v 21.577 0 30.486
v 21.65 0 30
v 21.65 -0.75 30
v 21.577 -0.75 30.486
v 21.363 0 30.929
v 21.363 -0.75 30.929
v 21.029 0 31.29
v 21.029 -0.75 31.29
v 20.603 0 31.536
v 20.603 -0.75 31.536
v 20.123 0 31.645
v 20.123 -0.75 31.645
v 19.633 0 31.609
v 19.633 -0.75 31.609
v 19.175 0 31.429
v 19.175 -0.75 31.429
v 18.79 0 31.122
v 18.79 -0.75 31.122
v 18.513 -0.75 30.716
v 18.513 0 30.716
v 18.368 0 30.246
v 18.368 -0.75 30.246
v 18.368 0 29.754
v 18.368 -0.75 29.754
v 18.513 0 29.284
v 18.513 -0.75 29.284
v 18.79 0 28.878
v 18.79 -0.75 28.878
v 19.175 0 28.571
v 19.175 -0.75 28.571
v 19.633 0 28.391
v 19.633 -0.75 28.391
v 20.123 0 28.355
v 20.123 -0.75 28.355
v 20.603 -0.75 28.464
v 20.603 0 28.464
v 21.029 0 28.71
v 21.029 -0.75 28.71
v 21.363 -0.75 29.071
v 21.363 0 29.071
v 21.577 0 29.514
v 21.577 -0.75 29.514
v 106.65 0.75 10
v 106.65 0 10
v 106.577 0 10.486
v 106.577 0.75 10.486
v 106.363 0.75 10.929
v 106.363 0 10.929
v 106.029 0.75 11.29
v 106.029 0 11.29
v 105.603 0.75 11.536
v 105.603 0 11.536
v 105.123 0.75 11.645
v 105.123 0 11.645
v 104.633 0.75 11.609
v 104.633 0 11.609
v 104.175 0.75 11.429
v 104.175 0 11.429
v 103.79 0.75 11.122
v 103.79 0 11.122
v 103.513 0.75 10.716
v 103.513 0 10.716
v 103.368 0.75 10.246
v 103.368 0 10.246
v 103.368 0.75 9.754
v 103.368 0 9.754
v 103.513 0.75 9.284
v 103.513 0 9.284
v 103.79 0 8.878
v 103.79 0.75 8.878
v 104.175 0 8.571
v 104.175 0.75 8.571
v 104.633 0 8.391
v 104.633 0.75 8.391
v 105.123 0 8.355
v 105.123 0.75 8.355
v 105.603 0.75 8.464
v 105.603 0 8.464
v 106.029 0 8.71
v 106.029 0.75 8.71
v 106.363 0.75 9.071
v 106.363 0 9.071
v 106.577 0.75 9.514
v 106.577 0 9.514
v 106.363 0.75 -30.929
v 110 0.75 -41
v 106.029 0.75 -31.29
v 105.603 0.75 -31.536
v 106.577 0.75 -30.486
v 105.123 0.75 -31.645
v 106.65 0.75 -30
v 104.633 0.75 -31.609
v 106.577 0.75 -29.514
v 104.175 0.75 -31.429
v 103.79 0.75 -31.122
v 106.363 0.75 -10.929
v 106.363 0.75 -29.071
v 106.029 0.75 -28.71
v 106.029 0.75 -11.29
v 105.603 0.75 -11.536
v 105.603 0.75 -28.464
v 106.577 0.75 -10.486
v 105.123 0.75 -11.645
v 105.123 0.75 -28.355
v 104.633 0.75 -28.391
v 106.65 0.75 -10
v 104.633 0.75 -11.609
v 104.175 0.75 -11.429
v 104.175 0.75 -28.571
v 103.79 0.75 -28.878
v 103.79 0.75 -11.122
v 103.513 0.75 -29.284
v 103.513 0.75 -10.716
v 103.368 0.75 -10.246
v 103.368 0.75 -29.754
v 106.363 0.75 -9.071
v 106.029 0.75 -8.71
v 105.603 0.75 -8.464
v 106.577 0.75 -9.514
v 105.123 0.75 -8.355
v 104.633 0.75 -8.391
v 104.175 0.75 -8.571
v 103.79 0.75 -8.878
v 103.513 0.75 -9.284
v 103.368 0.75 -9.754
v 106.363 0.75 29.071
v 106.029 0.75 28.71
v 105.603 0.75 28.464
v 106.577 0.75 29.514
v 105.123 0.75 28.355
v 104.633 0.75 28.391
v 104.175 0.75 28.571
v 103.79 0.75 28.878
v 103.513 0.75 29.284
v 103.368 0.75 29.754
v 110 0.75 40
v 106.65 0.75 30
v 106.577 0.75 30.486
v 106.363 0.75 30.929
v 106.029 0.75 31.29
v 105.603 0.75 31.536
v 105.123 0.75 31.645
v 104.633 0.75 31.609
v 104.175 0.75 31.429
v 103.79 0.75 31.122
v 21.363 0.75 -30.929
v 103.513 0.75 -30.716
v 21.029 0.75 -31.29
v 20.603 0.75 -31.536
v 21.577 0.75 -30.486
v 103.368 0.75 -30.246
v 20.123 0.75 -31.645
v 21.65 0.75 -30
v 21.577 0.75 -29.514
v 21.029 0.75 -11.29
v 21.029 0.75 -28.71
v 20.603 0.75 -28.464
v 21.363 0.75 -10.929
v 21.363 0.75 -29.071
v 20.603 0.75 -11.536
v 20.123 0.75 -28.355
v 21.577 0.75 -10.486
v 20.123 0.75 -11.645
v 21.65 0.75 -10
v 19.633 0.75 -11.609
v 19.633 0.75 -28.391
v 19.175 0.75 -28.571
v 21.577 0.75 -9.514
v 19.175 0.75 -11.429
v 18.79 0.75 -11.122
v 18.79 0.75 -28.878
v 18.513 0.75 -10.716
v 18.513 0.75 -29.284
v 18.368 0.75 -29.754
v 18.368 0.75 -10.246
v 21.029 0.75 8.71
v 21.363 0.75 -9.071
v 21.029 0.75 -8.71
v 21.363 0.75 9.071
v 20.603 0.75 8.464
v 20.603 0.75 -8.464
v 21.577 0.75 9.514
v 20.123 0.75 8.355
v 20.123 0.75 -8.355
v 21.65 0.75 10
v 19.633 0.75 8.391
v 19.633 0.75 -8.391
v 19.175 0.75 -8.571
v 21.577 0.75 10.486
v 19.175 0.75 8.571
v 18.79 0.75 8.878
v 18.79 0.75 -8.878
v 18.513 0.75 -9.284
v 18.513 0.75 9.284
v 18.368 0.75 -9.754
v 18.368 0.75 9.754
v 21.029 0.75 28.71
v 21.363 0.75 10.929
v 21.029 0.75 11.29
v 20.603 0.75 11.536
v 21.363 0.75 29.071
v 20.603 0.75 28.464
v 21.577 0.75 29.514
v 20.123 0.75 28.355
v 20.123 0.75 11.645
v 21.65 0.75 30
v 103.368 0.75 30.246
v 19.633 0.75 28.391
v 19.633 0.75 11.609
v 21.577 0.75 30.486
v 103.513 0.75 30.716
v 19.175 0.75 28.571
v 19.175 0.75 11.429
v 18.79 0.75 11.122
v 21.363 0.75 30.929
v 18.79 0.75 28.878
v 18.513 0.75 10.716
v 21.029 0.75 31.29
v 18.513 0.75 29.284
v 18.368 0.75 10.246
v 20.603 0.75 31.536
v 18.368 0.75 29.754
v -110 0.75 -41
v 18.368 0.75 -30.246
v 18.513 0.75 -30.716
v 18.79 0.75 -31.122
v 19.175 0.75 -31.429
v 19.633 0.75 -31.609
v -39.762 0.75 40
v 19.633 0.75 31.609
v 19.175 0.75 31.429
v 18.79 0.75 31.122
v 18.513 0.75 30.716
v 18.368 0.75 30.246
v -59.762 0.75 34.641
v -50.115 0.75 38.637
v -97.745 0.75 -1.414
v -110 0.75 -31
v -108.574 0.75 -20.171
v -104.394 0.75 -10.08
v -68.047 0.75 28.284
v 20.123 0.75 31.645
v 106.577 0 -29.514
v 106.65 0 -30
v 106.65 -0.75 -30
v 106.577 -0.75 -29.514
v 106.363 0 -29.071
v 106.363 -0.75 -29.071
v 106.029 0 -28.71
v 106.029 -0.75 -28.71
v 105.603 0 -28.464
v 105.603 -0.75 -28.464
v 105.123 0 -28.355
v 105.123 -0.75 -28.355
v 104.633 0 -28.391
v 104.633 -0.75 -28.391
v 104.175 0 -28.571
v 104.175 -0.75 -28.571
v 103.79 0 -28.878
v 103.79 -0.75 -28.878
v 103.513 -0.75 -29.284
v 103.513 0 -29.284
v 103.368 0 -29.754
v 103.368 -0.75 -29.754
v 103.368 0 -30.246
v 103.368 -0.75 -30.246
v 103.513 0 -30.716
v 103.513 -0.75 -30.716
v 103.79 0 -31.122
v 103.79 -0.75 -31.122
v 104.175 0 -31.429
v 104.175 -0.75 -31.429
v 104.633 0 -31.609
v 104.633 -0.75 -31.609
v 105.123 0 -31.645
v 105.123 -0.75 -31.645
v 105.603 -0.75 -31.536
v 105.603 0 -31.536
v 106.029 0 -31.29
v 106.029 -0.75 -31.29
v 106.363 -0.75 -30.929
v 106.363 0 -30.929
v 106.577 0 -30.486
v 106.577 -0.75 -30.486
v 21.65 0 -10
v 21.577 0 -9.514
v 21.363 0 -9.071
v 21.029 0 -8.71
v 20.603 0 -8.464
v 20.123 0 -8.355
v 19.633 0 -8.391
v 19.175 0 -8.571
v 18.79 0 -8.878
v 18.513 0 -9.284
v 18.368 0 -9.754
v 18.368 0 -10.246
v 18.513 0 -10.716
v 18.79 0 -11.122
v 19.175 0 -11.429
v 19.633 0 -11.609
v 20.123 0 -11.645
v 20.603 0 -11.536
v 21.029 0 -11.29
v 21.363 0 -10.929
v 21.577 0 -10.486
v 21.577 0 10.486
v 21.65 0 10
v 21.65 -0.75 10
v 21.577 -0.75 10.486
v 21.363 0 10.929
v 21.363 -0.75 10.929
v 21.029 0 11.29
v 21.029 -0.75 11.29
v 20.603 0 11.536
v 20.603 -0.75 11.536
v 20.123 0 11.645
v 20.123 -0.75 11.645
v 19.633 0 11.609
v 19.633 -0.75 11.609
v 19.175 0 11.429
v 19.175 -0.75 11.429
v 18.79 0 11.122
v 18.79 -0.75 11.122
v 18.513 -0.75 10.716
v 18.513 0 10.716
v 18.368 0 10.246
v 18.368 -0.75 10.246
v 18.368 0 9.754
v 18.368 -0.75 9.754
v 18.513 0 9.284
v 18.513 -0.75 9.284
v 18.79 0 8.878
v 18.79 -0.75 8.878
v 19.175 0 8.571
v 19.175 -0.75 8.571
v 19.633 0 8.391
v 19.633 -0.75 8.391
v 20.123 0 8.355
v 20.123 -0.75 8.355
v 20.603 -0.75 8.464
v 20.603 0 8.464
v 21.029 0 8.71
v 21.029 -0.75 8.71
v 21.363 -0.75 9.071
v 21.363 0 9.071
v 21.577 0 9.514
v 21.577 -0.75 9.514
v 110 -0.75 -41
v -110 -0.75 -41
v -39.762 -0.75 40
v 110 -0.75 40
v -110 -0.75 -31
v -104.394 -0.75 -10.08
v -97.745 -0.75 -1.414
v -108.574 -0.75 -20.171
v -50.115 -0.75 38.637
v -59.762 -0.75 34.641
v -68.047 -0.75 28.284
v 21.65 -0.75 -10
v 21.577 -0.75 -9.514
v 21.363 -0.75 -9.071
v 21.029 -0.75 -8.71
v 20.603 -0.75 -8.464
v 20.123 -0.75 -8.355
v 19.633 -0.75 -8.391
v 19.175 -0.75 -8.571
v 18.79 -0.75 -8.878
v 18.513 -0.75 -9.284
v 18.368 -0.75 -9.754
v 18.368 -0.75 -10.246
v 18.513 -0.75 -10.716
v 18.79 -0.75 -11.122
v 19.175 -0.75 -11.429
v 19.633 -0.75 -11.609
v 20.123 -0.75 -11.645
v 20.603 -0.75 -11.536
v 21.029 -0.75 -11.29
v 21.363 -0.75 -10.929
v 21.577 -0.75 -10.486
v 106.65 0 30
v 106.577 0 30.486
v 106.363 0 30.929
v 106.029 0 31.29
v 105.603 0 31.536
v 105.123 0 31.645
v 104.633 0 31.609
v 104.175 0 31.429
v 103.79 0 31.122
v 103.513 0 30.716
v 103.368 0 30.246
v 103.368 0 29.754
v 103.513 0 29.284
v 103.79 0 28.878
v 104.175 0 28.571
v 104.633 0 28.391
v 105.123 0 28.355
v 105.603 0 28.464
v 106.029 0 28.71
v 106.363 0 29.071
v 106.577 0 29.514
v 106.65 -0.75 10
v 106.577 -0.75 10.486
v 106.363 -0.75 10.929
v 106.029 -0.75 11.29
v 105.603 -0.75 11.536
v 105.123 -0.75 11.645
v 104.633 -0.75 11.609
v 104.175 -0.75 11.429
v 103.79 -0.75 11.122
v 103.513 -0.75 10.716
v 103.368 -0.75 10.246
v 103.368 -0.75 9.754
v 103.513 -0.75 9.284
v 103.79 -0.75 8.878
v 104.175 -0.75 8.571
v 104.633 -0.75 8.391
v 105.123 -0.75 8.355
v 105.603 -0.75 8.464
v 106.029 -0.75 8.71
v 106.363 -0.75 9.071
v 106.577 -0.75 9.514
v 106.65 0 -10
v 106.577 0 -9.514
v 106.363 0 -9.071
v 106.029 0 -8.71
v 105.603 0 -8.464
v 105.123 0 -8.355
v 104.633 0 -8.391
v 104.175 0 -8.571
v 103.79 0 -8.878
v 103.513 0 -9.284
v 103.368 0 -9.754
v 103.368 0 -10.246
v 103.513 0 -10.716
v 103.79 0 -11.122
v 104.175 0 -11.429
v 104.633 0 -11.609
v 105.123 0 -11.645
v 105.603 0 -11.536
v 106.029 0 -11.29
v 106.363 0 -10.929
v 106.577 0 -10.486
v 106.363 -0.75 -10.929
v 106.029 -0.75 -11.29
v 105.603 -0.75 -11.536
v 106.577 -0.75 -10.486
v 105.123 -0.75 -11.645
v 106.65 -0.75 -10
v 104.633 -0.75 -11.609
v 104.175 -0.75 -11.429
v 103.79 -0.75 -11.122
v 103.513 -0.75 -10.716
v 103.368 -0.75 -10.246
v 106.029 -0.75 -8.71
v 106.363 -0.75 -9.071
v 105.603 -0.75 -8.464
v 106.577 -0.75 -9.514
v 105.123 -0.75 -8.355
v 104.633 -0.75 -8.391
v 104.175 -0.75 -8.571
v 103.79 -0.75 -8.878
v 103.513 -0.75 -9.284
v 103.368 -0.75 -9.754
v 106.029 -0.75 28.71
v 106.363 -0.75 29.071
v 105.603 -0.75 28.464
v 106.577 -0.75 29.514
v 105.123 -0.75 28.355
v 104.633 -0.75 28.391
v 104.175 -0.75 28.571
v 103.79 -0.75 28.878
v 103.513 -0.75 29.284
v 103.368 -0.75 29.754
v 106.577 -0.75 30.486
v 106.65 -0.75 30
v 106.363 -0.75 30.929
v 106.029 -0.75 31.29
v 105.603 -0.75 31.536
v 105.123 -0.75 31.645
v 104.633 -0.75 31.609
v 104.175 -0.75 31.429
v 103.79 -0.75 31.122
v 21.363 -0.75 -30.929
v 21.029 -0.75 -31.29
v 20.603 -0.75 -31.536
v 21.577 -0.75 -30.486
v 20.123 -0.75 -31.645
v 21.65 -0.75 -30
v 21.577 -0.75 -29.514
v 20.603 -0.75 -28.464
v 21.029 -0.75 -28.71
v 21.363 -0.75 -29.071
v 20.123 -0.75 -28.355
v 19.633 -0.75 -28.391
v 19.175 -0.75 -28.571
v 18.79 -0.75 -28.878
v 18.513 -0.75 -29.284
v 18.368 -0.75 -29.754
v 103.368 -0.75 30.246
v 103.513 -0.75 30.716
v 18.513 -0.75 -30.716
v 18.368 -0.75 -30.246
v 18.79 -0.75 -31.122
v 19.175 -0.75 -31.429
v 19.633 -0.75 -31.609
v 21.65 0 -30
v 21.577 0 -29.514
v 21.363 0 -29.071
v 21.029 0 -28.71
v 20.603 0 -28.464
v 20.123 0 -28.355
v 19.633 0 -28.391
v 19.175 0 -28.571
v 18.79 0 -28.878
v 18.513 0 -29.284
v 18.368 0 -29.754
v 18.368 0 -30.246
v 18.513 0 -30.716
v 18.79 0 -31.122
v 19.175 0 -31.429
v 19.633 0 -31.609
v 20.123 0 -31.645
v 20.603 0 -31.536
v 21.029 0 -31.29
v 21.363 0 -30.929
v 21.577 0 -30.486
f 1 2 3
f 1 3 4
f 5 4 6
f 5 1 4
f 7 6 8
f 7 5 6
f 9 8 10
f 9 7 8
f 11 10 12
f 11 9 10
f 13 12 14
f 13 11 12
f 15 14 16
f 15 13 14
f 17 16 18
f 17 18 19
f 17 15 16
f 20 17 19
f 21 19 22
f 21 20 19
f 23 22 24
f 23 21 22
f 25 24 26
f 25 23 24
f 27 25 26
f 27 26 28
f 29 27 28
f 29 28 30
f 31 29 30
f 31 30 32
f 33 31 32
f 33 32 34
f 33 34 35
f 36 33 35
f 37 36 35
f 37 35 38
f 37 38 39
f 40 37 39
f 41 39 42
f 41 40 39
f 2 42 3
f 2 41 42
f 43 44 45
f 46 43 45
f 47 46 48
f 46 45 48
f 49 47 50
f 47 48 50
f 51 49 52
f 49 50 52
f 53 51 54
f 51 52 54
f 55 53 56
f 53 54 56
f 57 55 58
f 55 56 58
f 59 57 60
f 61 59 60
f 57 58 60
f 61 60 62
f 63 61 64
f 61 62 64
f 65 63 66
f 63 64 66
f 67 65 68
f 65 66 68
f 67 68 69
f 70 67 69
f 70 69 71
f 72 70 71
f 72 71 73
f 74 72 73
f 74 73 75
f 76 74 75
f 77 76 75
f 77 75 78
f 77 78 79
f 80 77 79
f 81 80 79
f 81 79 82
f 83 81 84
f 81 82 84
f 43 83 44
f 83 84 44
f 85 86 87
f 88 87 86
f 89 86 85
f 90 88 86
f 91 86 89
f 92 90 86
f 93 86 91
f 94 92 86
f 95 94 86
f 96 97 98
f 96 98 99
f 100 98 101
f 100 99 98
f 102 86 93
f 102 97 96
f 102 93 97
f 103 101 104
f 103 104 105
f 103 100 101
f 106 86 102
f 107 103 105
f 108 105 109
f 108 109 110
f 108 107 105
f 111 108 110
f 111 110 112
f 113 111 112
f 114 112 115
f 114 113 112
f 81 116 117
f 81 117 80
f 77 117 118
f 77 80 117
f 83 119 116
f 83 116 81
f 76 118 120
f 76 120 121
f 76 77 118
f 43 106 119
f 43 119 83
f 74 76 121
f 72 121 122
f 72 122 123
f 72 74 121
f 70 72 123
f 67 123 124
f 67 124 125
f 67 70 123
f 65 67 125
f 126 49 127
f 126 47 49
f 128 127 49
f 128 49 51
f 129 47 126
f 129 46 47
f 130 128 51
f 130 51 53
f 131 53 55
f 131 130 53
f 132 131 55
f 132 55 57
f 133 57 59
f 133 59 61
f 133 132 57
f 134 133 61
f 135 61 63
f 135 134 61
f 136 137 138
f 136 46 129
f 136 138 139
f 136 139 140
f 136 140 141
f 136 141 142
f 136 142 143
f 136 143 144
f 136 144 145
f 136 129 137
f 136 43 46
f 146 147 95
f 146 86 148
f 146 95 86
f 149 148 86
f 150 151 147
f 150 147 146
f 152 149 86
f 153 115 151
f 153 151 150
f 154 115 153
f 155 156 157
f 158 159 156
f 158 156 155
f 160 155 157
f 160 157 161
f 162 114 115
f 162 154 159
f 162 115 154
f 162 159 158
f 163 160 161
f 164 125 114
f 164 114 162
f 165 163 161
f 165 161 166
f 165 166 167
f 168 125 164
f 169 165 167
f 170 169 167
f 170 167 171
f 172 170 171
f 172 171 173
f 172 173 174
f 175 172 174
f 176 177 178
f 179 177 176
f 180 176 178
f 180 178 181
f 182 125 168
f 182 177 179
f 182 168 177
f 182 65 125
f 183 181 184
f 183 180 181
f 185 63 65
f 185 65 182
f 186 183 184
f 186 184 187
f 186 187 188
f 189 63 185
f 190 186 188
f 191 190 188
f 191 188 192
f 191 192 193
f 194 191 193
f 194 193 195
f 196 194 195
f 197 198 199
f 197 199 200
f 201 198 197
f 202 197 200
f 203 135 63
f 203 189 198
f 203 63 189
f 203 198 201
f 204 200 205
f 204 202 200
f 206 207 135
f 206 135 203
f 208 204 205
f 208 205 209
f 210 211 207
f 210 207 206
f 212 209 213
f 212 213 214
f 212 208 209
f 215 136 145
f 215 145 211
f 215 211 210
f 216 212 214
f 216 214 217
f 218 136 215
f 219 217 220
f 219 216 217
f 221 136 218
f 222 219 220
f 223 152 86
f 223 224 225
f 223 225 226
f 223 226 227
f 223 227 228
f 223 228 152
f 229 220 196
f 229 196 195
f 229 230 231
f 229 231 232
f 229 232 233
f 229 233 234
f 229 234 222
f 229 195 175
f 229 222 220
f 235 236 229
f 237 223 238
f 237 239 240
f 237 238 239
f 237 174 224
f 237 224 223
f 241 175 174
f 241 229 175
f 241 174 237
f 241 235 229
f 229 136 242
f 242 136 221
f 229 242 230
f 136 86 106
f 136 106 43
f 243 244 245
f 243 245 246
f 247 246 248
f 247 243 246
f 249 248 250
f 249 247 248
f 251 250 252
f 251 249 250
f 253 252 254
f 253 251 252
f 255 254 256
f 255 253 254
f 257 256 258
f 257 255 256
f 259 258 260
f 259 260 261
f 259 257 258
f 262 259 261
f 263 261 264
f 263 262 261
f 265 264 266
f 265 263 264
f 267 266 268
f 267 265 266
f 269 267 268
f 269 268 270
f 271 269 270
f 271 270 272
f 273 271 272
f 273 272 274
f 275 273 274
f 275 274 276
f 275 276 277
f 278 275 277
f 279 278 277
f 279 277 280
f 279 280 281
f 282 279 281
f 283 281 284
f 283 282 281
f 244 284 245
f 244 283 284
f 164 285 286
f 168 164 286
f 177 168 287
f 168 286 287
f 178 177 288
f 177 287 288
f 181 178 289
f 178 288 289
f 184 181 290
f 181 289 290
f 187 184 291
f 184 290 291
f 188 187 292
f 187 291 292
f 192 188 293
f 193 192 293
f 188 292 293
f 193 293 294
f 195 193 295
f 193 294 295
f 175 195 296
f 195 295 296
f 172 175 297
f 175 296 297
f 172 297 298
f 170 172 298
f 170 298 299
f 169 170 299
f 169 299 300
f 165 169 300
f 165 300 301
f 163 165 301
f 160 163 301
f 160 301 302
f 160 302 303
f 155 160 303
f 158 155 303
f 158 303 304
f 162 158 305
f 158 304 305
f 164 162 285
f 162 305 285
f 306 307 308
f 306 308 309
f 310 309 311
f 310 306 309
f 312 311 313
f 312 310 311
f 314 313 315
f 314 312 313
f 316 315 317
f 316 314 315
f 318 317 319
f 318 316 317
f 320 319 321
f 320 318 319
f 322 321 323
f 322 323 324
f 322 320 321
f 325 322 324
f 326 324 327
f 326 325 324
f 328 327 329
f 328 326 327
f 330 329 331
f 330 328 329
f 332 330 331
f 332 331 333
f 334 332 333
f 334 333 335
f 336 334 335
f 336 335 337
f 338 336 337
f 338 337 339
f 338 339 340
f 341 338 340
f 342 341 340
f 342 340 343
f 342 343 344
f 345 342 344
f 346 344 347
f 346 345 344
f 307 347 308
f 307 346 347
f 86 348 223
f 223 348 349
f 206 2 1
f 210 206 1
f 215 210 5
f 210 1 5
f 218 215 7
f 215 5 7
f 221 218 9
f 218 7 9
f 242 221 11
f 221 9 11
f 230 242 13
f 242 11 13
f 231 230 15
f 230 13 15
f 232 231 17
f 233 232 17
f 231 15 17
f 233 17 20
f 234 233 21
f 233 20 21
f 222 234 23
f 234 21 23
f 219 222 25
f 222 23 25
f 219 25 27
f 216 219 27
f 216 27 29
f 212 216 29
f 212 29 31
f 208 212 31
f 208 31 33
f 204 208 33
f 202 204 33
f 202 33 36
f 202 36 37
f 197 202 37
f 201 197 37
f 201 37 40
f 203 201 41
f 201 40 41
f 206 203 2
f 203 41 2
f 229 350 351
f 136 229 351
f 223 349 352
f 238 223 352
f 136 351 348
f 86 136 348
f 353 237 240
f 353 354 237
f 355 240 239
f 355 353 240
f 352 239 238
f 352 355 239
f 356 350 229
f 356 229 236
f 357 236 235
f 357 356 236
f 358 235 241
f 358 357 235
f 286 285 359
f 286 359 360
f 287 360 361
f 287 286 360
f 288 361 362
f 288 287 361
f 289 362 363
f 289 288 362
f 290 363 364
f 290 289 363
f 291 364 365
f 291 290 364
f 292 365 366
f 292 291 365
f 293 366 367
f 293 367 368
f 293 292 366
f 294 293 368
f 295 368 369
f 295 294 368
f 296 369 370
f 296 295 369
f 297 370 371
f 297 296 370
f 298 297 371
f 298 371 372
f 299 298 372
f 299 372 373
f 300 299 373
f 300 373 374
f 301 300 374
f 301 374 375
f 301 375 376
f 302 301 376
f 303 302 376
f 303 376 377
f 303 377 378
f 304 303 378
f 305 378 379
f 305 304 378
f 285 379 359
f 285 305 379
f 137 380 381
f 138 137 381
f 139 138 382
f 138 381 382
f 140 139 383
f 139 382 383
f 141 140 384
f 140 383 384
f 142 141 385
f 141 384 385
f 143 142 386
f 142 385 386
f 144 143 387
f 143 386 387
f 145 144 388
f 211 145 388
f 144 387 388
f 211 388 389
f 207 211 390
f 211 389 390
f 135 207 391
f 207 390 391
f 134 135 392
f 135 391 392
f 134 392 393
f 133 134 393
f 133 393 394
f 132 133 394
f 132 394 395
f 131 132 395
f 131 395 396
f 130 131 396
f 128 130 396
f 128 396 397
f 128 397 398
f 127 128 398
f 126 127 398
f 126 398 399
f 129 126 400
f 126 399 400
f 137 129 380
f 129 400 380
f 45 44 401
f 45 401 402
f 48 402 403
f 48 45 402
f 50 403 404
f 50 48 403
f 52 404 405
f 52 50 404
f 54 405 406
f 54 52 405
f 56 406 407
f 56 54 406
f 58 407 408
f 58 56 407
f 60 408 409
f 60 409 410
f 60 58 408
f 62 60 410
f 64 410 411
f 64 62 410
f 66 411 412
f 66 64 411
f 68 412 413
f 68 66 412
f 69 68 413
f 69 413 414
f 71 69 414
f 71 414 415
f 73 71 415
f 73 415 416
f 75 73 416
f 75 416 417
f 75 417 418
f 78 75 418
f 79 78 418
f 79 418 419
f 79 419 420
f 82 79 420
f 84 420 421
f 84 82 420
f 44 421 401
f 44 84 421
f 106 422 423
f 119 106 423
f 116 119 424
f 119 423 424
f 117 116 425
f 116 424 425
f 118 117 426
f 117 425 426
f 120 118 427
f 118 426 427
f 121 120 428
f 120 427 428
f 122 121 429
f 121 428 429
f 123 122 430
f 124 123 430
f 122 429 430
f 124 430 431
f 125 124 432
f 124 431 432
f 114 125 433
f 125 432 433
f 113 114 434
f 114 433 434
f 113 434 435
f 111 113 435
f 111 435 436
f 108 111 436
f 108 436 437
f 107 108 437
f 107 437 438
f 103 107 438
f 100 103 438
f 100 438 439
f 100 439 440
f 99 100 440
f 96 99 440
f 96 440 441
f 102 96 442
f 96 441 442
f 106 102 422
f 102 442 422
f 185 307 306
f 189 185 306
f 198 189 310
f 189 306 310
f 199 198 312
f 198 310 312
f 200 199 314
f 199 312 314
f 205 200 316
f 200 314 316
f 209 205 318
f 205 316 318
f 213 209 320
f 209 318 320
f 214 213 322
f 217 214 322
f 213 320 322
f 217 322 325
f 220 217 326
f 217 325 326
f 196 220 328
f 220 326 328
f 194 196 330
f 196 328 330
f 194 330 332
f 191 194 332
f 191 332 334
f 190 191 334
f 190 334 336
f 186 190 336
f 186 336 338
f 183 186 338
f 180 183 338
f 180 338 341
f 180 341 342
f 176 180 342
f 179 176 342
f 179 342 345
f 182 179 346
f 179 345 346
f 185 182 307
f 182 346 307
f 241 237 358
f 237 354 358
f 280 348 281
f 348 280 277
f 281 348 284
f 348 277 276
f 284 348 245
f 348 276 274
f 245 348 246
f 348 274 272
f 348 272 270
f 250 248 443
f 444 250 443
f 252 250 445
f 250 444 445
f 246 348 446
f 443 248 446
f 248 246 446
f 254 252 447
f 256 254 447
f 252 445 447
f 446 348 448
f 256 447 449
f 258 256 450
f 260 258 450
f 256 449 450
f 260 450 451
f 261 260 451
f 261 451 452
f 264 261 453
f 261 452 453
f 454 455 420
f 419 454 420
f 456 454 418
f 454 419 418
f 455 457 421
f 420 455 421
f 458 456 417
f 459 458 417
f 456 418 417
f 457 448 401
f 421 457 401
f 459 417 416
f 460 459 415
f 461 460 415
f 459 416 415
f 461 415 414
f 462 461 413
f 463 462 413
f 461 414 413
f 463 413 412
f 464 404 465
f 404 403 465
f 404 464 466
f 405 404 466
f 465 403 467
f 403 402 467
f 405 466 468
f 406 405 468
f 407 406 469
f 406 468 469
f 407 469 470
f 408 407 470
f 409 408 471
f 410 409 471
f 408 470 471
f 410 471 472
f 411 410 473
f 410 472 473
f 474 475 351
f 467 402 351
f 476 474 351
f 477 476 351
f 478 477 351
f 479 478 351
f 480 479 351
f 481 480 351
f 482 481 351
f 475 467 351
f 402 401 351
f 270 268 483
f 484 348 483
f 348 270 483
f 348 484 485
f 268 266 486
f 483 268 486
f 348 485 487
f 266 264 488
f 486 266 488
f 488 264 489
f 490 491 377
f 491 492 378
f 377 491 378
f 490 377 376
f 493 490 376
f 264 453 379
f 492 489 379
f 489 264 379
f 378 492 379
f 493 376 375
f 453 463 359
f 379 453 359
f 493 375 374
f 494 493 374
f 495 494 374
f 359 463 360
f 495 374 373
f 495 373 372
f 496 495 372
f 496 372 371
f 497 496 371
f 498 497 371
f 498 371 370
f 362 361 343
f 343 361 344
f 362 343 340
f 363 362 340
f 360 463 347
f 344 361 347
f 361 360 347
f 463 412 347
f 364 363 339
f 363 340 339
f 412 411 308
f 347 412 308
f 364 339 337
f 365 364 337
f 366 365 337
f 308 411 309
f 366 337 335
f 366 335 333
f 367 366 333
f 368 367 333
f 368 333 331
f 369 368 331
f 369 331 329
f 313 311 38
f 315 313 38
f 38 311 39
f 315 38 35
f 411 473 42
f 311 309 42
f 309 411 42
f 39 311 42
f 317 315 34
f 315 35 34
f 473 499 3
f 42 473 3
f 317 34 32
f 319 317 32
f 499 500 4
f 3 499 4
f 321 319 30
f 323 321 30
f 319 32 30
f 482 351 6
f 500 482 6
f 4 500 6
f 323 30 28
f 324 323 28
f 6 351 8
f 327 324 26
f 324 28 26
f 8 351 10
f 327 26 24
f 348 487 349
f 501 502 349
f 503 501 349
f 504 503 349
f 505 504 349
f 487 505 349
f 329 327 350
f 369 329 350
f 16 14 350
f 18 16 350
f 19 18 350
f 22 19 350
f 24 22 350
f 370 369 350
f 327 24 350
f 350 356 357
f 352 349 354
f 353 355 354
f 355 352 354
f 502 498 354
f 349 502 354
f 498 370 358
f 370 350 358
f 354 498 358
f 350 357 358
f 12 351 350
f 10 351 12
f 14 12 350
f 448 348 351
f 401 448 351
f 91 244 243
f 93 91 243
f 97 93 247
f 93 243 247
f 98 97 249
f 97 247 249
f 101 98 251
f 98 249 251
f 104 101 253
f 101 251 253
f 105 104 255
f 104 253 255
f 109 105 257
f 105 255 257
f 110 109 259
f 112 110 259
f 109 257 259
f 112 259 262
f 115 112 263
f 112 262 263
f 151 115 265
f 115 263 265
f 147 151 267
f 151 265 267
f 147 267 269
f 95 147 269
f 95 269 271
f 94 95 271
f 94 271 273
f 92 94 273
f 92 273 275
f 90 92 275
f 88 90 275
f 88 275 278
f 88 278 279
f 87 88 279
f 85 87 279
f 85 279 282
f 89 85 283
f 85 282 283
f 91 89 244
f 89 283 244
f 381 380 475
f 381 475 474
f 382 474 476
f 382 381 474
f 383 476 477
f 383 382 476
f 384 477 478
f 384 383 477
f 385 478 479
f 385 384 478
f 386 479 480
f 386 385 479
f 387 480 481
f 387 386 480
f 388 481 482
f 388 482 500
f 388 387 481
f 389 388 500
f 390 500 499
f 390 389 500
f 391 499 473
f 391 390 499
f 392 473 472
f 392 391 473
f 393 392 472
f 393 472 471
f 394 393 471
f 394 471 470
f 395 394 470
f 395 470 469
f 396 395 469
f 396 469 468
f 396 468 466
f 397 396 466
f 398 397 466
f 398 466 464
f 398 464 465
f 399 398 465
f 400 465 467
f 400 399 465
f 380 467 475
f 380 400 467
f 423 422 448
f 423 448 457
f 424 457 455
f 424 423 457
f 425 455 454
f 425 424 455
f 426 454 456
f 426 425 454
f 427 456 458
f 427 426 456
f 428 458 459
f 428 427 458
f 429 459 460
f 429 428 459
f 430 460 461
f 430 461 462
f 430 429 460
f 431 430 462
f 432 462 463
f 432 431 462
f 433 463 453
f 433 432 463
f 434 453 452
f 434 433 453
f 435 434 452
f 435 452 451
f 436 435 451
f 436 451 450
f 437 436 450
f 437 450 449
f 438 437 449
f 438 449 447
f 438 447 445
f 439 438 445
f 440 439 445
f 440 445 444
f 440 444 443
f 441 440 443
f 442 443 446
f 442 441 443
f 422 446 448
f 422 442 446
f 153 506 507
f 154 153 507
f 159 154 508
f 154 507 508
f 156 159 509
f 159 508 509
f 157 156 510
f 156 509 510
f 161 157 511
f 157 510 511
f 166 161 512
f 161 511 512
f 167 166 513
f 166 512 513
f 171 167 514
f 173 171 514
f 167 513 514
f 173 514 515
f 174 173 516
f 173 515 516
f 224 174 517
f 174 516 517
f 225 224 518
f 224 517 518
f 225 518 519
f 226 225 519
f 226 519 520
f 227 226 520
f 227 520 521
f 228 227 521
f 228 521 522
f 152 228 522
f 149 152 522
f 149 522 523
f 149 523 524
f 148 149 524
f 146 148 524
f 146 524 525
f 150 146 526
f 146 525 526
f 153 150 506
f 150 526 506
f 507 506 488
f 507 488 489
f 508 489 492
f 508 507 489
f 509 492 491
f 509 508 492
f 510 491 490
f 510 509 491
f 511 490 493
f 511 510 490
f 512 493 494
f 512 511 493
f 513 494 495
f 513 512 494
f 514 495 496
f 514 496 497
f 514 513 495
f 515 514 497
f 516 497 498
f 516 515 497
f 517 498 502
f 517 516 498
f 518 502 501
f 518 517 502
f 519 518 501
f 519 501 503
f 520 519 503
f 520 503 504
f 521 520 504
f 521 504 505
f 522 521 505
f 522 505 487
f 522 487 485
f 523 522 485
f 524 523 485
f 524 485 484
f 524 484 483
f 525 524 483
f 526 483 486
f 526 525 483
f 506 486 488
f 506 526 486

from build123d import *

# Parameters (mm, degrees)
SKETCH_R       = 1.65
PAD_DEPTH      = 0.75
PAD_DEPTH_BACK = 0.75


with BuildPart() as part:
    # Sketch → Pad (new body, two sides)
    with BuildSketch(Plane.XZ) as pad_sk:
        with BuildLine():
            Line((-110, -41), (-110, -31))
            ThreePointArc((-97.745166, -1.414214), (-106.815072, -14.988288), (-110, -31))
            Line((-97.745166, -1.414214), (-68.046681, 28.284271))
            ThreePointArc((-39.76241, 40), (-55.069747, 36.955181), (-68.046681, 28.284271))
            Line((-39.76241, 40), (110, 40))
            Line((110, 40), (110, -41))
            Line((110, -41), (-110, -41))
        make_face()
        with Locations((105, 30)):
            Circle(SKETCH_R, mode=Mode.SUBTRACT)
        with Locations((20, 30)):
            Circle(SKETCH_R, mode=Mode.SUBTRACT)
        with Locations((20, 10)):
            Circle(SKETCH_R, mode=Mode.SUBTRACT)
        with Locations((105, 10)):
            Circle(SKETCH_R, mode=Mode.SUBTRACT)
        with Locations((105, -30)):
            Circle(SKETCH_R, mode=Mode.SUBTRACT)
        with Locations((20, -30)):
            Circle(SKETCH_R, mode=Mode.SUBTRACT)
        with Locations((20, -10)):
            Circle(SKETCH_R, mode=Mode.SUBTRACT)
        with Locations((105, -10)):
            Circle(SKETCH_R, mode=Mode.SUBTRACT)
    extrude(amount=PAD_DEPTH)
    extrude(pad_sk.sketch, amount=-PAD_DEPTH_BACK)


solid = part.part
